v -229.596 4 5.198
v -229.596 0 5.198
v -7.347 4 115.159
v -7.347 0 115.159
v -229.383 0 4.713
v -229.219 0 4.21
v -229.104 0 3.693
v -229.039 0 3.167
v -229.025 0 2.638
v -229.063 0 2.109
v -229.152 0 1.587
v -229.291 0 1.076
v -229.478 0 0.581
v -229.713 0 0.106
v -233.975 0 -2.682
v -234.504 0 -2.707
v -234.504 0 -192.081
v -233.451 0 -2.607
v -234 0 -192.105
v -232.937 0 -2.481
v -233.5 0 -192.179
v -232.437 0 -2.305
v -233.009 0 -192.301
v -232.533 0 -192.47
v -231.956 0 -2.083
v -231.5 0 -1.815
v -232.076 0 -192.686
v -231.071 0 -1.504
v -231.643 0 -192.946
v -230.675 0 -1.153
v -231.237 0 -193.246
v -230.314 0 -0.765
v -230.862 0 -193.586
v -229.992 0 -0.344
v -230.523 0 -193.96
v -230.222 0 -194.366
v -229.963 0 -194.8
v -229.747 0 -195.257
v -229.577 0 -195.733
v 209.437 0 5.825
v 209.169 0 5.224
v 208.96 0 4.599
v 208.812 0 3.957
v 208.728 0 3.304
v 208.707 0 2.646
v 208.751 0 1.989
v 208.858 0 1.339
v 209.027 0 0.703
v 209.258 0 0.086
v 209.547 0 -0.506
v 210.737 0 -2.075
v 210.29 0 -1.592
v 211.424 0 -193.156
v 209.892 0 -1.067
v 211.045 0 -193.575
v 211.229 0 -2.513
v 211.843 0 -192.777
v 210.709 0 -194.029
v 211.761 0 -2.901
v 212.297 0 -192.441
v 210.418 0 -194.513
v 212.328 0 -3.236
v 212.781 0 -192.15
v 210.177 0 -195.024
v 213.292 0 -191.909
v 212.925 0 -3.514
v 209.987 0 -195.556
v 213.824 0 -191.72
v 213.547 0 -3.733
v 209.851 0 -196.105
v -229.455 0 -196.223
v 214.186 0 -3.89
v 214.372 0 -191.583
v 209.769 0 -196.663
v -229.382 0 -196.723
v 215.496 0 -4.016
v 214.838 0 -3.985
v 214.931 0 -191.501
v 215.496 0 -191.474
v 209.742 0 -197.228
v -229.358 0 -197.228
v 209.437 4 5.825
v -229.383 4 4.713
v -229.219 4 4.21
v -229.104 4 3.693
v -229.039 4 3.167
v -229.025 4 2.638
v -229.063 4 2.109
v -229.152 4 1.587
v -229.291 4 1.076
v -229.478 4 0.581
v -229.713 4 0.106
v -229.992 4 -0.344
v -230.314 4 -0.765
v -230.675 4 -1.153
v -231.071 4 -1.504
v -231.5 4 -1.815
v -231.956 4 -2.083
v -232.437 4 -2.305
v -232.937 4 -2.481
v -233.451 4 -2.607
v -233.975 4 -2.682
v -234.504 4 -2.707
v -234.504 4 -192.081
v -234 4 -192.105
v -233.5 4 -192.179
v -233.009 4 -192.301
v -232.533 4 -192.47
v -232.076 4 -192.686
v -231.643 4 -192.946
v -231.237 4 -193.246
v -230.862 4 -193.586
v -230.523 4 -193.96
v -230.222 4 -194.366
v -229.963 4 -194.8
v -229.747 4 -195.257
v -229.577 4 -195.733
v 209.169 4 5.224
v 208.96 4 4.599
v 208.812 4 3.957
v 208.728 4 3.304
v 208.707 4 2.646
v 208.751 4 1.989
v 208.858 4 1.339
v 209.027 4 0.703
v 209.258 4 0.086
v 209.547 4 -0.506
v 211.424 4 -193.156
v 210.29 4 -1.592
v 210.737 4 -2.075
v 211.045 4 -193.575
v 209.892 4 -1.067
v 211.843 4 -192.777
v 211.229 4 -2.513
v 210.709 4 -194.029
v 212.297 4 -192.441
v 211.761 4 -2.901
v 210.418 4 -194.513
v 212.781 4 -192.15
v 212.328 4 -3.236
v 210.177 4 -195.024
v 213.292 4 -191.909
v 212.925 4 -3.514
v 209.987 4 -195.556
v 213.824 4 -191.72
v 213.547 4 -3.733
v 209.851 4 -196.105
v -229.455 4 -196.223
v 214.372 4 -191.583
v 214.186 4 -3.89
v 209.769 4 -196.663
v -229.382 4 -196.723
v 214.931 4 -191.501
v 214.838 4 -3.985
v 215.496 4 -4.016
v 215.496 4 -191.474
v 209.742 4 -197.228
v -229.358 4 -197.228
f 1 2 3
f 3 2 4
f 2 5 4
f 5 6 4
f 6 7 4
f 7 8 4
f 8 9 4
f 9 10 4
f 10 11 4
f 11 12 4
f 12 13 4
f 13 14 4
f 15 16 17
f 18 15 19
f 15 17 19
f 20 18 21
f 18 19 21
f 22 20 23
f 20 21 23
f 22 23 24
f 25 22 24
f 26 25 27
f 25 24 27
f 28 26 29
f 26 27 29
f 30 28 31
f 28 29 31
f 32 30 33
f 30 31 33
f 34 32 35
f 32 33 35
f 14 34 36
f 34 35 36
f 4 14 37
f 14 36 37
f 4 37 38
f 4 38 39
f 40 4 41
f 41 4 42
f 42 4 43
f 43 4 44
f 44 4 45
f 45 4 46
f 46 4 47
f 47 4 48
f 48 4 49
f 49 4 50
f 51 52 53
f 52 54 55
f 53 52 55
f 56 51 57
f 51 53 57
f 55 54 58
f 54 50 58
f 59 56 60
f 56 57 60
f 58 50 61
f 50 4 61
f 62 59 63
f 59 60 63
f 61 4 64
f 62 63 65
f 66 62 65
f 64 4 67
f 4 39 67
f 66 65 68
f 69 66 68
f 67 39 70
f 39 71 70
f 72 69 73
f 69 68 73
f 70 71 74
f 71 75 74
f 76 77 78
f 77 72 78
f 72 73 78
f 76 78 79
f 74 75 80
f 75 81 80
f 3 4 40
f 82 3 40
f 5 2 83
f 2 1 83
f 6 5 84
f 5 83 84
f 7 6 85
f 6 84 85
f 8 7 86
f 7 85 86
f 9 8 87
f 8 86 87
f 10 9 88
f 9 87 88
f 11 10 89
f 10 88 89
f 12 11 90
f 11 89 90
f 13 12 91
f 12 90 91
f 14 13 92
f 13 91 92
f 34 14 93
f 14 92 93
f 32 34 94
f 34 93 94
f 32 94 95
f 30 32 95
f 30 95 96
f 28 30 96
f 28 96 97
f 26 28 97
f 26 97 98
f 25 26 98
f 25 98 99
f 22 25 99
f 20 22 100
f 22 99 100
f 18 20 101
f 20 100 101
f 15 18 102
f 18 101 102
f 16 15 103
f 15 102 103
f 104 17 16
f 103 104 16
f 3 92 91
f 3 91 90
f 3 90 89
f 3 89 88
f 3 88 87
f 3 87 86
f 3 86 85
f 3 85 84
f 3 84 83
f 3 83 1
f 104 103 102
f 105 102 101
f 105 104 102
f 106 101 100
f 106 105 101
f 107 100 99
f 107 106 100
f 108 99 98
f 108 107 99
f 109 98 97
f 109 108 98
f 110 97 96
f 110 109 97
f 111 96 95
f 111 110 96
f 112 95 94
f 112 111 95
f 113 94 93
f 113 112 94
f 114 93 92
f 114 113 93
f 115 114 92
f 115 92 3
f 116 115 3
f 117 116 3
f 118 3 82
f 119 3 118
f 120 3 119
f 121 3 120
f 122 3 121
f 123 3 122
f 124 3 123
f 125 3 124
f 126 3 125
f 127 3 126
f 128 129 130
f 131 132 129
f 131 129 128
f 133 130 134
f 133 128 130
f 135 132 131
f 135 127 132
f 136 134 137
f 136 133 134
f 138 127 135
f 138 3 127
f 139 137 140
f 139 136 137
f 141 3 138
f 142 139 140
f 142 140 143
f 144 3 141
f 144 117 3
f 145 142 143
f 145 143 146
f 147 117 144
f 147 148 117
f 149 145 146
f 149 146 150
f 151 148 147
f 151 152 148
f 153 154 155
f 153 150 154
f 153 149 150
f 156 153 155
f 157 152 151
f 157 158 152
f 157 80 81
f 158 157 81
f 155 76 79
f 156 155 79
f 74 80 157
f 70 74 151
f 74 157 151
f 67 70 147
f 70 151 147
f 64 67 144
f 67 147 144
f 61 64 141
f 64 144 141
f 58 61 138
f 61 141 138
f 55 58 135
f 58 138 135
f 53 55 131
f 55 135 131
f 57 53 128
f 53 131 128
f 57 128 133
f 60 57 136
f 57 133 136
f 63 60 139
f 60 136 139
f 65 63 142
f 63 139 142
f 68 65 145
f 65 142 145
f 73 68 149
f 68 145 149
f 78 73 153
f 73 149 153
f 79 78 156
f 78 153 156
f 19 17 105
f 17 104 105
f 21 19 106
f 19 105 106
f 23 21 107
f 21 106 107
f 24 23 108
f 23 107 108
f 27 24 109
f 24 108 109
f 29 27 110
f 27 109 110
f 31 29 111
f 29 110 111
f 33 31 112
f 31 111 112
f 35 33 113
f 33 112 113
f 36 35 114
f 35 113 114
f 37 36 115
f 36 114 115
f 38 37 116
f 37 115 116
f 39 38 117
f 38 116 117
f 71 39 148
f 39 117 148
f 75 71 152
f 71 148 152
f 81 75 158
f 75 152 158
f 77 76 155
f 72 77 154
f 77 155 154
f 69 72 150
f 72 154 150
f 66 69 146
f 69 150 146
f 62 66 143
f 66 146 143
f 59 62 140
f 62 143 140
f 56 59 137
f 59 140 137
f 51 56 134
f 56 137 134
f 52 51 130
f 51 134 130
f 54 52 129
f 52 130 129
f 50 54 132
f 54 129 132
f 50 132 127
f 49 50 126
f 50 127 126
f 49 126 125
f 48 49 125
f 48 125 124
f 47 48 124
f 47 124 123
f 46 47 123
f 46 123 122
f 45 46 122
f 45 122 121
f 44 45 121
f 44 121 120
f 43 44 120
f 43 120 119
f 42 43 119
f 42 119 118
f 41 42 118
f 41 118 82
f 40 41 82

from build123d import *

# Parameters (mm, degrees)
BOSS_EXTRUDE1_DEPTH = 4
SKETCH3_R           = 5.470416759
SKETCH3_R_2         = 5.136398205
SKETCH3_R_3         = 5.743645838
SKETCH3_R_4         = 6.779267961
CUT_EXTRUDE2_DEPTH  = 85


with BuildPart() as part:
    # Sketch1 → Boss-Extrude1 (new body)
    with BuildSketch(Plane(origin=(0, 0, 0), x_dir=(1, 0, 0), z_dir=(0, 1, 0))):
        with BuildLine():
            Line((-234.498829852, -2.772290193), (-7.346998412, -115.1588183))
            Line((-7.346998412, -115.1588183), (215.490107836, -2.772308919))
            ThreePointArc((215.490107836, -2.772308919), (215.494120314, -2.768622763), (215.495604699, -2.763380215))
            Line((215.495604699, -2.763380215), (215.495604699, 197.217709807))
            ThreePointArc((215.495604699, 197.217709807), (215.492675767, 197.224780875), (215.485604699, 197.227709807))
            Line((215.485604699, 197.227709807), (-234.494395301, 197.227709807))
            ThreePointArc((-234.494395301, 197.227709807), (-234.501466368, 197.224780875), (-234.504395301, 197.217709807))
            Line((-234.504395301, 197.217709807), (-234.504395301, -2.763327228))
            ThreePointArc((-234.504395301, -2.763327228), (-234.502890756, -2.768602381), (-234.498829852, -2.772290193))
        make_face()
    extrude(amount=BOSS_EXTRUDE1_DEPTH)

    # Sketch3 → Cut-Extrude2 (cut)
    with BuildSketch(Plane(origin=(0, 4, 0), x_dir=(1, 0, 0), z_dir=(0, 1, 0))):
        with Locations((-234.494395301, -2.763327228)):
            Circle(SKETCH3_R)
        with Locations((-234.494395301, 197.217709807)):
            Circle(SKETCH3_R_2)
        with Locations((215.485604699, 197.217709807)):
            Circle(SKETCH3_R_3)
        with Locations((215.485604699, -2.763380215)):
            Circle(SKETCH3_R_4)
    extrude(amount=-CUT_EXTRUDE2_DEPTH, mode=Mode.SUBTRACT)


solid = part.part
